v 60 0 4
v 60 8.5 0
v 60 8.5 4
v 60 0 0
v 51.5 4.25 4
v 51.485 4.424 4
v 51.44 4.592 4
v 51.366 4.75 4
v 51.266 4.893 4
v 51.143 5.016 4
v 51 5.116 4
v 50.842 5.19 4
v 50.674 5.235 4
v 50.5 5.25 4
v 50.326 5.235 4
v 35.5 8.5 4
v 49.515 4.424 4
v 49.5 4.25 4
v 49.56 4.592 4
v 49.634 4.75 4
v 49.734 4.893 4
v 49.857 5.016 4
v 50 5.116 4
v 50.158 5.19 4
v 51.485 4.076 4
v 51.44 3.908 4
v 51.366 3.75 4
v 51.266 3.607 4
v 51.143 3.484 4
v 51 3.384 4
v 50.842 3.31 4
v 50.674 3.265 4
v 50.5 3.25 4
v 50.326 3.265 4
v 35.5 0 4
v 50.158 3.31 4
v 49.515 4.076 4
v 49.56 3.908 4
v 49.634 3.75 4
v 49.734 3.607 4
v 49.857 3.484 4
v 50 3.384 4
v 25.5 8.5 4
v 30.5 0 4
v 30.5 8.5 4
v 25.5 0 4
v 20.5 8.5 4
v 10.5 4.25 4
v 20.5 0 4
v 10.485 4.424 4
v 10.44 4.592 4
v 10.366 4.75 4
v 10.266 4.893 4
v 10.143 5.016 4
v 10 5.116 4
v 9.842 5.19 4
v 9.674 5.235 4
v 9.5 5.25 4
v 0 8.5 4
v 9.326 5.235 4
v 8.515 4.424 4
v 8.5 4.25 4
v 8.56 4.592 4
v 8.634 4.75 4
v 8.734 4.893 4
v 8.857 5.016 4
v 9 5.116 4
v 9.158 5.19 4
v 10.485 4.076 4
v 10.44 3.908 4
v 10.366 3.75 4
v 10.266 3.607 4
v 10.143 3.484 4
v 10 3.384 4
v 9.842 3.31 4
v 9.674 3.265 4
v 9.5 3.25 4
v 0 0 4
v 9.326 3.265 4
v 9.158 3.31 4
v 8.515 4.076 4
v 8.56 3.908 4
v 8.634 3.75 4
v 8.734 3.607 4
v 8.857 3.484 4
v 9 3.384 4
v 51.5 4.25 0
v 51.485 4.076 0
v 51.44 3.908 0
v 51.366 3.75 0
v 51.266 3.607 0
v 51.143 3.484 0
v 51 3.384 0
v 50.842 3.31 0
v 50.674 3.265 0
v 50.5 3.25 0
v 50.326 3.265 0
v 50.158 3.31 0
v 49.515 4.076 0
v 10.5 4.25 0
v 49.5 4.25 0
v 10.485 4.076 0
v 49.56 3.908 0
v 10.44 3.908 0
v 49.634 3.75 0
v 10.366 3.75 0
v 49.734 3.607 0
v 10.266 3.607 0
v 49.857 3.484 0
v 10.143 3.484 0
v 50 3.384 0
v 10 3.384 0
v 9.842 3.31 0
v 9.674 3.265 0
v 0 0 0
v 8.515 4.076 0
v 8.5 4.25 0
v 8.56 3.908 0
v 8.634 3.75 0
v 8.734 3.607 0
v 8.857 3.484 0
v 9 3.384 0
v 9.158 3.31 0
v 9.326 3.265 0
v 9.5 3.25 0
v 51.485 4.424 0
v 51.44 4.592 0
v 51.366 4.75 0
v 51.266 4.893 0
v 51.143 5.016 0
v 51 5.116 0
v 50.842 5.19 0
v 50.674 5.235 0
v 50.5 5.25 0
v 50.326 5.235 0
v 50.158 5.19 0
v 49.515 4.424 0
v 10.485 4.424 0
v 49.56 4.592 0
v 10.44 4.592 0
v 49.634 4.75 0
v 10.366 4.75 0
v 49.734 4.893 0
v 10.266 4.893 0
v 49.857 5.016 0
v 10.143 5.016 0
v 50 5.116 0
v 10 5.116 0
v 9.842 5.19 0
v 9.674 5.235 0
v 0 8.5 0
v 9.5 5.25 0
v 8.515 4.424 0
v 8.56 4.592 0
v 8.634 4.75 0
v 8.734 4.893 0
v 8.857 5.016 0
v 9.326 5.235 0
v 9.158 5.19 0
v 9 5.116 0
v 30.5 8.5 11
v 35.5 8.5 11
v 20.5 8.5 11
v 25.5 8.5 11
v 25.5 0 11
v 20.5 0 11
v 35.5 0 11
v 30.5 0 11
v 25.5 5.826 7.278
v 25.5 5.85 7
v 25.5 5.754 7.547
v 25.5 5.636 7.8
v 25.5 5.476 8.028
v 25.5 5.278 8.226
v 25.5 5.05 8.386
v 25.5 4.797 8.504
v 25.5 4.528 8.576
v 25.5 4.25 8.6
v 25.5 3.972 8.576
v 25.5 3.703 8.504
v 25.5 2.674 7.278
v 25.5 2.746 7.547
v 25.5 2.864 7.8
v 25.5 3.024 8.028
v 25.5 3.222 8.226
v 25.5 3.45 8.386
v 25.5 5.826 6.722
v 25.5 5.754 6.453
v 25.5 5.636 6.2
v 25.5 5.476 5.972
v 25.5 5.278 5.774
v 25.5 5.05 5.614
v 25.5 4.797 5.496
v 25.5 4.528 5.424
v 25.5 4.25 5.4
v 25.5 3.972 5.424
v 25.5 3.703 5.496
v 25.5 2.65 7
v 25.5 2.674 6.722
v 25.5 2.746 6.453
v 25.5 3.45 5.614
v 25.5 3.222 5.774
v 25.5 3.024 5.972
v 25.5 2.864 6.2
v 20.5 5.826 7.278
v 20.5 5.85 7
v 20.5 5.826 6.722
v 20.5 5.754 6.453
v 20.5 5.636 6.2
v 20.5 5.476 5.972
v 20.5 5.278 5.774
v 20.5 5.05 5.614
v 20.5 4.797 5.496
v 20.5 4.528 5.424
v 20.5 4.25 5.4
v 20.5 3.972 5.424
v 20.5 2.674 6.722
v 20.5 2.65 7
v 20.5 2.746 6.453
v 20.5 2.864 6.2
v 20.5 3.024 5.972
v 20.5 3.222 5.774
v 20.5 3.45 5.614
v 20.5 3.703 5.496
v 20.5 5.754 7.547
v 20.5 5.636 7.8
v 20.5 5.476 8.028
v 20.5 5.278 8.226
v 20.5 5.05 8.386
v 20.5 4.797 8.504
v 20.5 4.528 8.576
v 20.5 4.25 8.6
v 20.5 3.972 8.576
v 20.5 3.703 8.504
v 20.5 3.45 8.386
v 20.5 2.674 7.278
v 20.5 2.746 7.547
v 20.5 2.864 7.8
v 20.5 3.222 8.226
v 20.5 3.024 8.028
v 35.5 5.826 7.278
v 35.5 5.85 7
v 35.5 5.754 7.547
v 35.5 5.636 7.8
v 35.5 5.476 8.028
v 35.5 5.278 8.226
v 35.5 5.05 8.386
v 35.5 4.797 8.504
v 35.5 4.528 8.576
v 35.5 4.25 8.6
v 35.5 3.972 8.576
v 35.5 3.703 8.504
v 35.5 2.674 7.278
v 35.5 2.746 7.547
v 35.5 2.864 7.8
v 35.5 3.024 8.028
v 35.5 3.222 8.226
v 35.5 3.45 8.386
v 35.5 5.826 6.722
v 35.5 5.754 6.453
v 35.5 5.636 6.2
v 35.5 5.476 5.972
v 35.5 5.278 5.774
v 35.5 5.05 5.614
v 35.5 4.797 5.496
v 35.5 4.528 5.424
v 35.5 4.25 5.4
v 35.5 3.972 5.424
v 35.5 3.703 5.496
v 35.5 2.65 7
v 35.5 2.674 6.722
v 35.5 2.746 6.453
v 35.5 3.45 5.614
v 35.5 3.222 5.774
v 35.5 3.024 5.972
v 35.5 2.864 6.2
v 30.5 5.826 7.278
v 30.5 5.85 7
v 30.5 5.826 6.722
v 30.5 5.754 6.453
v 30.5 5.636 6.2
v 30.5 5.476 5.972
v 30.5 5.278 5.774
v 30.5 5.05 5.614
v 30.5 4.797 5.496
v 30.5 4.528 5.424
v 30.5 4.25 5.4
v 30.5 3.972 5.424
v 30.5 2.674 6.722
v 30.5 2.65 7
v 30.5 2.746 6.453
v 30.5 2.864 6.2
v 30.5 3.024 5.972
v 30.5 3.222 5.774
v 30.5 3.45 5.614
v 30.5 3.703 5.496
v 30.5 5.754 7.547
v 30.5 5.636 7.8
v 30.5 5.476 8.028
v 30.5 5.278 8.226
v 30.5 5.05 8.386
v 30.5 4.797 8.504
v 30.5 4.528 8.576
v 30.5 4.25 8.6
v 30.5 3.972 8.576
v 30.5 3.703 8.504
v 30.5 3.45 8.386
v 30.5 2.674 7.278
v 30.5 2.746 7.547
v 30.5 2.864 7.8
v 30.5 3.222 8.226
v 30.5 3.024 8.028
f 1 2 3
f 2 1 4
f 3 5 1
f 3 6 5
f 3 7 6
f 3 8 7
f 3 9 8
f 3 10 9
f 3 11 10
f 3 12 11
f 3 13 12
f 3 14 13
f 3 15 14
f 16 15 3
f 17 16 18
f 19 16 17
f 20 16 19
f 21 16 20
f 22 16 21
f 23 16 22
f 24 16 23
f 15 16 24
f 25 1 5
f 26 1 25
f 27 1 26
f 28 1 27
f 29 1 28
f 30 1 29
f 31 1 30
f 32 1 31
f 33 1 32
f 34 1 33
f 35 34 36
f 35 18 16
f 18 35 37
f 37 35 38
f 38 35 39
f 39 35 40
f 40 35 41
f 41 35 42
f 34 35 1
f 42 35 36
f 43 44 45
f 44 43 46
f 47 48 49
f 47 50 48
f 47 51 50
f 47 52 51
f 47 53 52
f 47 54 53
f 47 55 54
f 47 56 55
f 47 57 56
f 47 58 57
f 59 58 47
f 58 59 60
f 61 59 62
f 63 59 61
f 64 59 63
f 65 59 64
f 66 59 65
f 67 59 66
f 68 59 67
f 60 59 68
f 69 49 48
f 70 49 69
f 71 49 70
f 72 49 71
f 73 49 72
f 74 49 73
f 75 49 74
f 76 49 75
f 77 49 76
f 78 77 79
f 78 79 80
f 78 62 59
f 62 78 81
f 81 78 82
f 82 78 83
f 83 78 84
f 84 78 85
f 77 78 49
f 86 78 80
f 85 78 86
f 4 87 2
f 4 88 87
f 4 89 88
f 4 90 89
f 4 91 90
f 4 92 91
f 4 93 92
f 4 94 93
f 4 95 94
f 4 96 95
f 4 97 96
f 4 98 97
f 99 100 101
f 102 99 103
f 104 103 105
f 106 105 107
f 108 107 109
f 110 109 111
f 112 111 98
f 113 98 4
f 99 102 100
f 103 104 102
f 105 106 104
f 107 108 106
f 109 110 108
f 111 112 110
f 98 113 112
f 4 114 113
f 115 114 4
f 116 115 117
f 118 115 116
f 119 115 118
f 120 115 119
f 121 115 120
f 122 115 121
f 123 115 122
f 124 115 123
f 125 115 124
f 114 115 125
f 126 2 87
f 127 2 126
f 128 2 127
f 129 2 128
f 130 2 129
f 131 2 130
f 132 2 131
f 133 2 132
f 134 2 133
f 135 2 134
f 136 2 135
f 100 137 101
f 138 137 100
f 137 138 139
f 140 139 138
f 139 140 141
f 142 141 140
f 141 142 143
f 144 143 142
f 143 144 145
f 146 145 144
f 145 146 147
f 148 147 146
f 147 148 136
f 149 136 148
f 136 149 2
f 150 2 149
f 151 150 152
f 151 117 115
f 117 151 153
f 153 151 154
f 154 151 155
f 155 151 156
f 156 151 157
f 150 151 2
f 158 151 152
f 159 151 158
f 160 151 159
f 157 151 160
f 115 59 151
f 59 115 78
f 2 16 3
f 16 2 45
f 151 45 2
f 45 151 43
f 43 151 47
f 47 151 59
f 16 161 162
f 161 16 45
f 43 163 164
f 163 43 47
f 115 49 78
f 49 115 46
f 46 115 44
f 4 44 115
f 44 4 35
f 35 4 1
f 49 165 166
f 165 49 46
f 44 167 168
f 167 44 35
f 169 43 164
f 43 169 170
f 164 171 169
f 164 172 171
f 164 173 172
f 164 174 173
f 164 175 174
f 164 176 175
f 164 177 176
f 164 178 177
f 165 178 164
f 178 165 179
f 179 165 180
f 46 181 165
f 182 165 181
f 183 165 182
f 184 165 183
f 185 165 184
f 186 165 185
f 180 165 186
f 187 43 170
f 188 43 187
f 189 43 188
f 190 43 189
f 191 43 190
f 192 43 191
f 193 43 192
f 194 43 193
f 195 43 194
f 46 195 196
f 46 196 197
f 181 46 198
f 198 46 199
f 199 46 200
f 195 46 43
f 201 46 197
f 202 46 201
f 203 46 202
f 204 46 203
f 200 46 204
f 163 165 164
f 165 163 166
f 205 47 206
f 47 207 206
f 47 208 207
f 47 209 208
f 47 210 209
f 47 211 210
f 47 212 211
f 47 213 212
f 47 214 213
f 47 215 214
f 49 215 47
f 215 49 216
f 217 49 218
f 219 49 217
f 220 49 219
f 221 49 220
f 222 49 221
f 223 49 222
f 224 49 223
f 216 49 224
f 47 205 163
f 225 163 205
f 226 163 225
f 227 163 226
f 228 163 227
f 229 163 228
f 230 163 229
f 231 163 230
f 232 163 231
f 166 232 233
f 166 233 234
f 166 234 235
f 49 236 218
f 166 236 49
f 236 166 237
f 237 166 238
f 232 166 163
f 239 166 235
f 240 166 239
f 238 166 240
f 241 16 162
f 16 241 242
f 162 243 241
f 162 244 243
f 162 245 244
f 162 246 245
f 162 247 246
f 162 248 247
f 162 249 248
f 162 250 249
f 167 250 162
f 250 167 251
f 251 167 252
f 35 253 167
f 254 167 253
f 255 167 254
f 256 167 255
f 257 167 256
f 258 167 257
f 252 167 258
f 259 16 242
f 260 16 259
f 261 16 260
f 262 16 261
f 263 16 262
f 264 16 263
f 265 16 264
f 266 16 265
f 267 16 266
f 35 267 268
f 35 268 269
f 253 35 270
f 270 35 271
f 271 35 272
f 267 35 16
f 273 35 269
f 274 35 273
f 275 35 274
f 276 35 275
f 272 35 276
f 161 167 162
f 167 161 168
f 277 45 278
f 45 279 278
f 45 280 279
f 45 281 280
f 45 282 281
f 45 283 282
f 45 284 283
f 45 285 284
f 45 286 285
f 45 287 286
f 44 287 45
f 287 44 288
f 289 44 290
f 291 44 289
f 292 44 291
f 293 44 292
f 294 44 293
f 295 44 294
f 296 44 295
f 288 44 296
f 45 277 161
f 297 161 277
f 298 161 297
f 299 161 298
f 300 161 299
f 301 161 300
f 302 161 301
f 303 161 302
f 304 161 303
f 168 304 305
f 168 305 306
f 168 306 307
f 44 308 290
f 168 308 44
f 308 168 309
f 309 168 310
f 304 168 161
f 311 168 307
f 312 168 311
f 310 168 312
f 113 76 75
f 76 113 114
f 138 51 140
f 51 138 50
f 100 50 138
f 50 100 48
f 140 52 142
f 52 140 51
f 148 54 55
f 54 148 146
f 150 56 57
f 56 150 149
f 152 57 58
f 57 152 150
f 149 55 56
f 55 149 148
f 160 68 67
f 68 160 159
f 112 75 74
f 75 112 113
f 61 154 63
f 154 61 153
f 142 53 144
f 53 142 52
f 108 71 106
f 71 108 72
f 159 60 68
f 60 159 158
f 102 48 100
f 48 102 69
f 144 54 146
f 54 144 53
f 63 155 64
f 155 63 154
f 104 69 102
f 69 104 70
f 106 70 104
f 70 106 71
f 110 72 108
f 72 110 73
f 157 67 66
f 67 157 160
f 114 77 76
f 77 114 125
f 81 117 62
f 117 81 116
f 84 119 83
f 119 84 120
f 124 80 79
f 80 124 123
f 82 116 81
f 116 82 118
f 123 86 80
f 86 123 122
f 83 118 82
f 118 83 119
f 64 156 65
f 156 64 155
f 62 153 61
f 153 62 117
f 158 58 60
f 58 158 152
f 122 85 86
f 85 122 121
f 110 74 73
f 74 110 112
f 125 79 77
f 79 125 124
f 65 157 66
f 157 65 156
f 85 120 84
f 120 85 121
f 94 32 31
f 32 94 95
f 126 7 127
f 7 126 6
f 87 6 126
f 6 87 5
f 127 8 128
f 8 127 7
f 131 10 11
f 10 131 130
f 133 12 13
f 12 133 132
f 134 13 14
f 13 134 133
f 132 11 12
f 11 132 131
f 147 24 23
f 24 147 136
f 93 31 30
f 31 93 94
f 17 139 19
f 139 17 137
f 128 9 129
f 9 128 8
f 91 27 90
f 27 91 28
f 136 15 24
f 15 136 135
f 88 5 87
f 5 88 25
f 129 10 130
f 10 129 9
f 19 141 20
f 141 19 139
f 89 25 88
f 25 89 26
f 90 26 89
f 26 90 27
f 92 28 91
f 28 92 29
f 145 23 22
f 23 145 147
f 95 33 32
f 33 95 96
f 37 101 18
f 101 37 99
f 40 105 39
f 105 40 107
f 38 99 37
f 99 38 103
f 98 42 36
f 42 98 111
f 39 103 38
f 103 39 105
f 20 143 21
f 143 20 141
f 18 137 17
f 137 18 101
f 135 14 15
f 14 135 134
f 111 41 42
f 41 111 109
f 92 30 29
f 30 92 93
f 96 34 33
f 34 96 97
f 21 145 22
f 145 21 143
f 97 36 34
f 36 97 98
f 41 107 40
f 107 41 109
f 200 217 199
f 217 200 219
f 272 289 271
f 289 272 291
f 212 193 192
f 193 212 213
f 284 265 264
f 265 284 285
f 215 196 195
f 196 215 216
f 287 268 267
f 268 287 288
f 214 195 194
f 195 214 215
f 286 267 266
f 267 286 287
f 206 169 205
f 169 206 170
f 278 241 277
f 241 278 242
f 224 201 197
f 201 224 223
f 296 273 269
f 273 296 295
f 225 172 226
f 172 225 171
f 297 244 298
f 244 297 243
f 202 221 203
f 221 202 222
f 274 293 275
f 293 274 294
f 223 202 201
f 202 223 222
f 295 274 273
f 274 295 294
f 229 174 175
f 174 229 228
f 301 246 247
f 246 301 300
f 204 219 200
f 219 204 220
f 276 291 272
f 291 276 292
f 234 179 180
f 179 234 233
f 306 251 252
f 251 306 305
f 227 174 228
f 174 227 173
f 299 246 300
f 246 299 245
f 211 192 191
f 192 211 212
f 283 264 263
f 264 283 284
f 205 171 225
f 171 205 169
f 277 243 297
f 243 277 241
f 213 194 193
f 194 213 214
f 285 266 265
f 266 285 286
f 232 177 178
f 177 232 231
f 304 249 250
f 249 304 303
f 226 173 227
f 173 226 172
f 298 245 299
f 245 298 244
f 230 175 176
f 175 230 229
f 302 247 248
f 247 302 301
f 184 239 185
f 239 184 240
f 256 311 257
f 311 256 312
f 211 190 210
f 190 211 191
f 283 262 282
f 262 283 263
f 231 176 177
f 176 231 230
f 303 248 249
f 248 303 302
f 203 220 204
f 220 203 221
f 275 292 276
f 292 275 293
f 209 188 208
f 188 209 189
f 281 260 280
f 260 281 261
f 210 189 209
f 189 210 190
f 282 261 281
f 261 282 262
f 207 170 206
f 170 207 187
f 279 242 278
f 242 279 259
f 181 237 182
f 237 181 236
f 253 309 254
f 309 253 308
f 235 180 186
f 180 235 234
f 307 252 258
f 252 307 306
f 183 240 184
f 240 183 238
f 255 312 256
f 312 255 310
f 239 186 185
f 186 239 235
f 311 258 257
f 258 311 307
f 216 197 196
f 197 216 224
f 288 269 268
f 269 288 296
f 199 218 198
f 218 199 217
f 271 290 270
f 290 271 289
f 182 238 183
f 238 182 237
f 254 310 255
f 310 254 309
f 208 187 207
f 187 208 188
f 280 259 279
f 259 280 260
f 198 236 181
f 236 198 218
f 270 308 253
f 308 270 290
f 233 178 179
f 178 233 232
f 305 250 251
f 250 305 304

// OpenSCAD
$fn=36;

difference(){
    union(){
        cube([60, 8.5, 4]);
        translate([20.5, 0, 4]){
            cube([5, 8.5, 7]);
        }

        translate([30.5, 0, 4]){
            cube([5, 8.5, 7]);
        }
    }
    
    // fixation holes
    //c hassis
    translate([9.5, 4.25, -1]){
        cylinder(r=1, h=10);
    }
    translate([50.5, 4.25, -1]){
        cylinder(r=1, h=10);
    }

    
    // motor
    rotate([0, 90, 0]){
        translate([-7, 4.25, 0]){
            cylinder(r=1.6, h=100);
        }
    }
}
